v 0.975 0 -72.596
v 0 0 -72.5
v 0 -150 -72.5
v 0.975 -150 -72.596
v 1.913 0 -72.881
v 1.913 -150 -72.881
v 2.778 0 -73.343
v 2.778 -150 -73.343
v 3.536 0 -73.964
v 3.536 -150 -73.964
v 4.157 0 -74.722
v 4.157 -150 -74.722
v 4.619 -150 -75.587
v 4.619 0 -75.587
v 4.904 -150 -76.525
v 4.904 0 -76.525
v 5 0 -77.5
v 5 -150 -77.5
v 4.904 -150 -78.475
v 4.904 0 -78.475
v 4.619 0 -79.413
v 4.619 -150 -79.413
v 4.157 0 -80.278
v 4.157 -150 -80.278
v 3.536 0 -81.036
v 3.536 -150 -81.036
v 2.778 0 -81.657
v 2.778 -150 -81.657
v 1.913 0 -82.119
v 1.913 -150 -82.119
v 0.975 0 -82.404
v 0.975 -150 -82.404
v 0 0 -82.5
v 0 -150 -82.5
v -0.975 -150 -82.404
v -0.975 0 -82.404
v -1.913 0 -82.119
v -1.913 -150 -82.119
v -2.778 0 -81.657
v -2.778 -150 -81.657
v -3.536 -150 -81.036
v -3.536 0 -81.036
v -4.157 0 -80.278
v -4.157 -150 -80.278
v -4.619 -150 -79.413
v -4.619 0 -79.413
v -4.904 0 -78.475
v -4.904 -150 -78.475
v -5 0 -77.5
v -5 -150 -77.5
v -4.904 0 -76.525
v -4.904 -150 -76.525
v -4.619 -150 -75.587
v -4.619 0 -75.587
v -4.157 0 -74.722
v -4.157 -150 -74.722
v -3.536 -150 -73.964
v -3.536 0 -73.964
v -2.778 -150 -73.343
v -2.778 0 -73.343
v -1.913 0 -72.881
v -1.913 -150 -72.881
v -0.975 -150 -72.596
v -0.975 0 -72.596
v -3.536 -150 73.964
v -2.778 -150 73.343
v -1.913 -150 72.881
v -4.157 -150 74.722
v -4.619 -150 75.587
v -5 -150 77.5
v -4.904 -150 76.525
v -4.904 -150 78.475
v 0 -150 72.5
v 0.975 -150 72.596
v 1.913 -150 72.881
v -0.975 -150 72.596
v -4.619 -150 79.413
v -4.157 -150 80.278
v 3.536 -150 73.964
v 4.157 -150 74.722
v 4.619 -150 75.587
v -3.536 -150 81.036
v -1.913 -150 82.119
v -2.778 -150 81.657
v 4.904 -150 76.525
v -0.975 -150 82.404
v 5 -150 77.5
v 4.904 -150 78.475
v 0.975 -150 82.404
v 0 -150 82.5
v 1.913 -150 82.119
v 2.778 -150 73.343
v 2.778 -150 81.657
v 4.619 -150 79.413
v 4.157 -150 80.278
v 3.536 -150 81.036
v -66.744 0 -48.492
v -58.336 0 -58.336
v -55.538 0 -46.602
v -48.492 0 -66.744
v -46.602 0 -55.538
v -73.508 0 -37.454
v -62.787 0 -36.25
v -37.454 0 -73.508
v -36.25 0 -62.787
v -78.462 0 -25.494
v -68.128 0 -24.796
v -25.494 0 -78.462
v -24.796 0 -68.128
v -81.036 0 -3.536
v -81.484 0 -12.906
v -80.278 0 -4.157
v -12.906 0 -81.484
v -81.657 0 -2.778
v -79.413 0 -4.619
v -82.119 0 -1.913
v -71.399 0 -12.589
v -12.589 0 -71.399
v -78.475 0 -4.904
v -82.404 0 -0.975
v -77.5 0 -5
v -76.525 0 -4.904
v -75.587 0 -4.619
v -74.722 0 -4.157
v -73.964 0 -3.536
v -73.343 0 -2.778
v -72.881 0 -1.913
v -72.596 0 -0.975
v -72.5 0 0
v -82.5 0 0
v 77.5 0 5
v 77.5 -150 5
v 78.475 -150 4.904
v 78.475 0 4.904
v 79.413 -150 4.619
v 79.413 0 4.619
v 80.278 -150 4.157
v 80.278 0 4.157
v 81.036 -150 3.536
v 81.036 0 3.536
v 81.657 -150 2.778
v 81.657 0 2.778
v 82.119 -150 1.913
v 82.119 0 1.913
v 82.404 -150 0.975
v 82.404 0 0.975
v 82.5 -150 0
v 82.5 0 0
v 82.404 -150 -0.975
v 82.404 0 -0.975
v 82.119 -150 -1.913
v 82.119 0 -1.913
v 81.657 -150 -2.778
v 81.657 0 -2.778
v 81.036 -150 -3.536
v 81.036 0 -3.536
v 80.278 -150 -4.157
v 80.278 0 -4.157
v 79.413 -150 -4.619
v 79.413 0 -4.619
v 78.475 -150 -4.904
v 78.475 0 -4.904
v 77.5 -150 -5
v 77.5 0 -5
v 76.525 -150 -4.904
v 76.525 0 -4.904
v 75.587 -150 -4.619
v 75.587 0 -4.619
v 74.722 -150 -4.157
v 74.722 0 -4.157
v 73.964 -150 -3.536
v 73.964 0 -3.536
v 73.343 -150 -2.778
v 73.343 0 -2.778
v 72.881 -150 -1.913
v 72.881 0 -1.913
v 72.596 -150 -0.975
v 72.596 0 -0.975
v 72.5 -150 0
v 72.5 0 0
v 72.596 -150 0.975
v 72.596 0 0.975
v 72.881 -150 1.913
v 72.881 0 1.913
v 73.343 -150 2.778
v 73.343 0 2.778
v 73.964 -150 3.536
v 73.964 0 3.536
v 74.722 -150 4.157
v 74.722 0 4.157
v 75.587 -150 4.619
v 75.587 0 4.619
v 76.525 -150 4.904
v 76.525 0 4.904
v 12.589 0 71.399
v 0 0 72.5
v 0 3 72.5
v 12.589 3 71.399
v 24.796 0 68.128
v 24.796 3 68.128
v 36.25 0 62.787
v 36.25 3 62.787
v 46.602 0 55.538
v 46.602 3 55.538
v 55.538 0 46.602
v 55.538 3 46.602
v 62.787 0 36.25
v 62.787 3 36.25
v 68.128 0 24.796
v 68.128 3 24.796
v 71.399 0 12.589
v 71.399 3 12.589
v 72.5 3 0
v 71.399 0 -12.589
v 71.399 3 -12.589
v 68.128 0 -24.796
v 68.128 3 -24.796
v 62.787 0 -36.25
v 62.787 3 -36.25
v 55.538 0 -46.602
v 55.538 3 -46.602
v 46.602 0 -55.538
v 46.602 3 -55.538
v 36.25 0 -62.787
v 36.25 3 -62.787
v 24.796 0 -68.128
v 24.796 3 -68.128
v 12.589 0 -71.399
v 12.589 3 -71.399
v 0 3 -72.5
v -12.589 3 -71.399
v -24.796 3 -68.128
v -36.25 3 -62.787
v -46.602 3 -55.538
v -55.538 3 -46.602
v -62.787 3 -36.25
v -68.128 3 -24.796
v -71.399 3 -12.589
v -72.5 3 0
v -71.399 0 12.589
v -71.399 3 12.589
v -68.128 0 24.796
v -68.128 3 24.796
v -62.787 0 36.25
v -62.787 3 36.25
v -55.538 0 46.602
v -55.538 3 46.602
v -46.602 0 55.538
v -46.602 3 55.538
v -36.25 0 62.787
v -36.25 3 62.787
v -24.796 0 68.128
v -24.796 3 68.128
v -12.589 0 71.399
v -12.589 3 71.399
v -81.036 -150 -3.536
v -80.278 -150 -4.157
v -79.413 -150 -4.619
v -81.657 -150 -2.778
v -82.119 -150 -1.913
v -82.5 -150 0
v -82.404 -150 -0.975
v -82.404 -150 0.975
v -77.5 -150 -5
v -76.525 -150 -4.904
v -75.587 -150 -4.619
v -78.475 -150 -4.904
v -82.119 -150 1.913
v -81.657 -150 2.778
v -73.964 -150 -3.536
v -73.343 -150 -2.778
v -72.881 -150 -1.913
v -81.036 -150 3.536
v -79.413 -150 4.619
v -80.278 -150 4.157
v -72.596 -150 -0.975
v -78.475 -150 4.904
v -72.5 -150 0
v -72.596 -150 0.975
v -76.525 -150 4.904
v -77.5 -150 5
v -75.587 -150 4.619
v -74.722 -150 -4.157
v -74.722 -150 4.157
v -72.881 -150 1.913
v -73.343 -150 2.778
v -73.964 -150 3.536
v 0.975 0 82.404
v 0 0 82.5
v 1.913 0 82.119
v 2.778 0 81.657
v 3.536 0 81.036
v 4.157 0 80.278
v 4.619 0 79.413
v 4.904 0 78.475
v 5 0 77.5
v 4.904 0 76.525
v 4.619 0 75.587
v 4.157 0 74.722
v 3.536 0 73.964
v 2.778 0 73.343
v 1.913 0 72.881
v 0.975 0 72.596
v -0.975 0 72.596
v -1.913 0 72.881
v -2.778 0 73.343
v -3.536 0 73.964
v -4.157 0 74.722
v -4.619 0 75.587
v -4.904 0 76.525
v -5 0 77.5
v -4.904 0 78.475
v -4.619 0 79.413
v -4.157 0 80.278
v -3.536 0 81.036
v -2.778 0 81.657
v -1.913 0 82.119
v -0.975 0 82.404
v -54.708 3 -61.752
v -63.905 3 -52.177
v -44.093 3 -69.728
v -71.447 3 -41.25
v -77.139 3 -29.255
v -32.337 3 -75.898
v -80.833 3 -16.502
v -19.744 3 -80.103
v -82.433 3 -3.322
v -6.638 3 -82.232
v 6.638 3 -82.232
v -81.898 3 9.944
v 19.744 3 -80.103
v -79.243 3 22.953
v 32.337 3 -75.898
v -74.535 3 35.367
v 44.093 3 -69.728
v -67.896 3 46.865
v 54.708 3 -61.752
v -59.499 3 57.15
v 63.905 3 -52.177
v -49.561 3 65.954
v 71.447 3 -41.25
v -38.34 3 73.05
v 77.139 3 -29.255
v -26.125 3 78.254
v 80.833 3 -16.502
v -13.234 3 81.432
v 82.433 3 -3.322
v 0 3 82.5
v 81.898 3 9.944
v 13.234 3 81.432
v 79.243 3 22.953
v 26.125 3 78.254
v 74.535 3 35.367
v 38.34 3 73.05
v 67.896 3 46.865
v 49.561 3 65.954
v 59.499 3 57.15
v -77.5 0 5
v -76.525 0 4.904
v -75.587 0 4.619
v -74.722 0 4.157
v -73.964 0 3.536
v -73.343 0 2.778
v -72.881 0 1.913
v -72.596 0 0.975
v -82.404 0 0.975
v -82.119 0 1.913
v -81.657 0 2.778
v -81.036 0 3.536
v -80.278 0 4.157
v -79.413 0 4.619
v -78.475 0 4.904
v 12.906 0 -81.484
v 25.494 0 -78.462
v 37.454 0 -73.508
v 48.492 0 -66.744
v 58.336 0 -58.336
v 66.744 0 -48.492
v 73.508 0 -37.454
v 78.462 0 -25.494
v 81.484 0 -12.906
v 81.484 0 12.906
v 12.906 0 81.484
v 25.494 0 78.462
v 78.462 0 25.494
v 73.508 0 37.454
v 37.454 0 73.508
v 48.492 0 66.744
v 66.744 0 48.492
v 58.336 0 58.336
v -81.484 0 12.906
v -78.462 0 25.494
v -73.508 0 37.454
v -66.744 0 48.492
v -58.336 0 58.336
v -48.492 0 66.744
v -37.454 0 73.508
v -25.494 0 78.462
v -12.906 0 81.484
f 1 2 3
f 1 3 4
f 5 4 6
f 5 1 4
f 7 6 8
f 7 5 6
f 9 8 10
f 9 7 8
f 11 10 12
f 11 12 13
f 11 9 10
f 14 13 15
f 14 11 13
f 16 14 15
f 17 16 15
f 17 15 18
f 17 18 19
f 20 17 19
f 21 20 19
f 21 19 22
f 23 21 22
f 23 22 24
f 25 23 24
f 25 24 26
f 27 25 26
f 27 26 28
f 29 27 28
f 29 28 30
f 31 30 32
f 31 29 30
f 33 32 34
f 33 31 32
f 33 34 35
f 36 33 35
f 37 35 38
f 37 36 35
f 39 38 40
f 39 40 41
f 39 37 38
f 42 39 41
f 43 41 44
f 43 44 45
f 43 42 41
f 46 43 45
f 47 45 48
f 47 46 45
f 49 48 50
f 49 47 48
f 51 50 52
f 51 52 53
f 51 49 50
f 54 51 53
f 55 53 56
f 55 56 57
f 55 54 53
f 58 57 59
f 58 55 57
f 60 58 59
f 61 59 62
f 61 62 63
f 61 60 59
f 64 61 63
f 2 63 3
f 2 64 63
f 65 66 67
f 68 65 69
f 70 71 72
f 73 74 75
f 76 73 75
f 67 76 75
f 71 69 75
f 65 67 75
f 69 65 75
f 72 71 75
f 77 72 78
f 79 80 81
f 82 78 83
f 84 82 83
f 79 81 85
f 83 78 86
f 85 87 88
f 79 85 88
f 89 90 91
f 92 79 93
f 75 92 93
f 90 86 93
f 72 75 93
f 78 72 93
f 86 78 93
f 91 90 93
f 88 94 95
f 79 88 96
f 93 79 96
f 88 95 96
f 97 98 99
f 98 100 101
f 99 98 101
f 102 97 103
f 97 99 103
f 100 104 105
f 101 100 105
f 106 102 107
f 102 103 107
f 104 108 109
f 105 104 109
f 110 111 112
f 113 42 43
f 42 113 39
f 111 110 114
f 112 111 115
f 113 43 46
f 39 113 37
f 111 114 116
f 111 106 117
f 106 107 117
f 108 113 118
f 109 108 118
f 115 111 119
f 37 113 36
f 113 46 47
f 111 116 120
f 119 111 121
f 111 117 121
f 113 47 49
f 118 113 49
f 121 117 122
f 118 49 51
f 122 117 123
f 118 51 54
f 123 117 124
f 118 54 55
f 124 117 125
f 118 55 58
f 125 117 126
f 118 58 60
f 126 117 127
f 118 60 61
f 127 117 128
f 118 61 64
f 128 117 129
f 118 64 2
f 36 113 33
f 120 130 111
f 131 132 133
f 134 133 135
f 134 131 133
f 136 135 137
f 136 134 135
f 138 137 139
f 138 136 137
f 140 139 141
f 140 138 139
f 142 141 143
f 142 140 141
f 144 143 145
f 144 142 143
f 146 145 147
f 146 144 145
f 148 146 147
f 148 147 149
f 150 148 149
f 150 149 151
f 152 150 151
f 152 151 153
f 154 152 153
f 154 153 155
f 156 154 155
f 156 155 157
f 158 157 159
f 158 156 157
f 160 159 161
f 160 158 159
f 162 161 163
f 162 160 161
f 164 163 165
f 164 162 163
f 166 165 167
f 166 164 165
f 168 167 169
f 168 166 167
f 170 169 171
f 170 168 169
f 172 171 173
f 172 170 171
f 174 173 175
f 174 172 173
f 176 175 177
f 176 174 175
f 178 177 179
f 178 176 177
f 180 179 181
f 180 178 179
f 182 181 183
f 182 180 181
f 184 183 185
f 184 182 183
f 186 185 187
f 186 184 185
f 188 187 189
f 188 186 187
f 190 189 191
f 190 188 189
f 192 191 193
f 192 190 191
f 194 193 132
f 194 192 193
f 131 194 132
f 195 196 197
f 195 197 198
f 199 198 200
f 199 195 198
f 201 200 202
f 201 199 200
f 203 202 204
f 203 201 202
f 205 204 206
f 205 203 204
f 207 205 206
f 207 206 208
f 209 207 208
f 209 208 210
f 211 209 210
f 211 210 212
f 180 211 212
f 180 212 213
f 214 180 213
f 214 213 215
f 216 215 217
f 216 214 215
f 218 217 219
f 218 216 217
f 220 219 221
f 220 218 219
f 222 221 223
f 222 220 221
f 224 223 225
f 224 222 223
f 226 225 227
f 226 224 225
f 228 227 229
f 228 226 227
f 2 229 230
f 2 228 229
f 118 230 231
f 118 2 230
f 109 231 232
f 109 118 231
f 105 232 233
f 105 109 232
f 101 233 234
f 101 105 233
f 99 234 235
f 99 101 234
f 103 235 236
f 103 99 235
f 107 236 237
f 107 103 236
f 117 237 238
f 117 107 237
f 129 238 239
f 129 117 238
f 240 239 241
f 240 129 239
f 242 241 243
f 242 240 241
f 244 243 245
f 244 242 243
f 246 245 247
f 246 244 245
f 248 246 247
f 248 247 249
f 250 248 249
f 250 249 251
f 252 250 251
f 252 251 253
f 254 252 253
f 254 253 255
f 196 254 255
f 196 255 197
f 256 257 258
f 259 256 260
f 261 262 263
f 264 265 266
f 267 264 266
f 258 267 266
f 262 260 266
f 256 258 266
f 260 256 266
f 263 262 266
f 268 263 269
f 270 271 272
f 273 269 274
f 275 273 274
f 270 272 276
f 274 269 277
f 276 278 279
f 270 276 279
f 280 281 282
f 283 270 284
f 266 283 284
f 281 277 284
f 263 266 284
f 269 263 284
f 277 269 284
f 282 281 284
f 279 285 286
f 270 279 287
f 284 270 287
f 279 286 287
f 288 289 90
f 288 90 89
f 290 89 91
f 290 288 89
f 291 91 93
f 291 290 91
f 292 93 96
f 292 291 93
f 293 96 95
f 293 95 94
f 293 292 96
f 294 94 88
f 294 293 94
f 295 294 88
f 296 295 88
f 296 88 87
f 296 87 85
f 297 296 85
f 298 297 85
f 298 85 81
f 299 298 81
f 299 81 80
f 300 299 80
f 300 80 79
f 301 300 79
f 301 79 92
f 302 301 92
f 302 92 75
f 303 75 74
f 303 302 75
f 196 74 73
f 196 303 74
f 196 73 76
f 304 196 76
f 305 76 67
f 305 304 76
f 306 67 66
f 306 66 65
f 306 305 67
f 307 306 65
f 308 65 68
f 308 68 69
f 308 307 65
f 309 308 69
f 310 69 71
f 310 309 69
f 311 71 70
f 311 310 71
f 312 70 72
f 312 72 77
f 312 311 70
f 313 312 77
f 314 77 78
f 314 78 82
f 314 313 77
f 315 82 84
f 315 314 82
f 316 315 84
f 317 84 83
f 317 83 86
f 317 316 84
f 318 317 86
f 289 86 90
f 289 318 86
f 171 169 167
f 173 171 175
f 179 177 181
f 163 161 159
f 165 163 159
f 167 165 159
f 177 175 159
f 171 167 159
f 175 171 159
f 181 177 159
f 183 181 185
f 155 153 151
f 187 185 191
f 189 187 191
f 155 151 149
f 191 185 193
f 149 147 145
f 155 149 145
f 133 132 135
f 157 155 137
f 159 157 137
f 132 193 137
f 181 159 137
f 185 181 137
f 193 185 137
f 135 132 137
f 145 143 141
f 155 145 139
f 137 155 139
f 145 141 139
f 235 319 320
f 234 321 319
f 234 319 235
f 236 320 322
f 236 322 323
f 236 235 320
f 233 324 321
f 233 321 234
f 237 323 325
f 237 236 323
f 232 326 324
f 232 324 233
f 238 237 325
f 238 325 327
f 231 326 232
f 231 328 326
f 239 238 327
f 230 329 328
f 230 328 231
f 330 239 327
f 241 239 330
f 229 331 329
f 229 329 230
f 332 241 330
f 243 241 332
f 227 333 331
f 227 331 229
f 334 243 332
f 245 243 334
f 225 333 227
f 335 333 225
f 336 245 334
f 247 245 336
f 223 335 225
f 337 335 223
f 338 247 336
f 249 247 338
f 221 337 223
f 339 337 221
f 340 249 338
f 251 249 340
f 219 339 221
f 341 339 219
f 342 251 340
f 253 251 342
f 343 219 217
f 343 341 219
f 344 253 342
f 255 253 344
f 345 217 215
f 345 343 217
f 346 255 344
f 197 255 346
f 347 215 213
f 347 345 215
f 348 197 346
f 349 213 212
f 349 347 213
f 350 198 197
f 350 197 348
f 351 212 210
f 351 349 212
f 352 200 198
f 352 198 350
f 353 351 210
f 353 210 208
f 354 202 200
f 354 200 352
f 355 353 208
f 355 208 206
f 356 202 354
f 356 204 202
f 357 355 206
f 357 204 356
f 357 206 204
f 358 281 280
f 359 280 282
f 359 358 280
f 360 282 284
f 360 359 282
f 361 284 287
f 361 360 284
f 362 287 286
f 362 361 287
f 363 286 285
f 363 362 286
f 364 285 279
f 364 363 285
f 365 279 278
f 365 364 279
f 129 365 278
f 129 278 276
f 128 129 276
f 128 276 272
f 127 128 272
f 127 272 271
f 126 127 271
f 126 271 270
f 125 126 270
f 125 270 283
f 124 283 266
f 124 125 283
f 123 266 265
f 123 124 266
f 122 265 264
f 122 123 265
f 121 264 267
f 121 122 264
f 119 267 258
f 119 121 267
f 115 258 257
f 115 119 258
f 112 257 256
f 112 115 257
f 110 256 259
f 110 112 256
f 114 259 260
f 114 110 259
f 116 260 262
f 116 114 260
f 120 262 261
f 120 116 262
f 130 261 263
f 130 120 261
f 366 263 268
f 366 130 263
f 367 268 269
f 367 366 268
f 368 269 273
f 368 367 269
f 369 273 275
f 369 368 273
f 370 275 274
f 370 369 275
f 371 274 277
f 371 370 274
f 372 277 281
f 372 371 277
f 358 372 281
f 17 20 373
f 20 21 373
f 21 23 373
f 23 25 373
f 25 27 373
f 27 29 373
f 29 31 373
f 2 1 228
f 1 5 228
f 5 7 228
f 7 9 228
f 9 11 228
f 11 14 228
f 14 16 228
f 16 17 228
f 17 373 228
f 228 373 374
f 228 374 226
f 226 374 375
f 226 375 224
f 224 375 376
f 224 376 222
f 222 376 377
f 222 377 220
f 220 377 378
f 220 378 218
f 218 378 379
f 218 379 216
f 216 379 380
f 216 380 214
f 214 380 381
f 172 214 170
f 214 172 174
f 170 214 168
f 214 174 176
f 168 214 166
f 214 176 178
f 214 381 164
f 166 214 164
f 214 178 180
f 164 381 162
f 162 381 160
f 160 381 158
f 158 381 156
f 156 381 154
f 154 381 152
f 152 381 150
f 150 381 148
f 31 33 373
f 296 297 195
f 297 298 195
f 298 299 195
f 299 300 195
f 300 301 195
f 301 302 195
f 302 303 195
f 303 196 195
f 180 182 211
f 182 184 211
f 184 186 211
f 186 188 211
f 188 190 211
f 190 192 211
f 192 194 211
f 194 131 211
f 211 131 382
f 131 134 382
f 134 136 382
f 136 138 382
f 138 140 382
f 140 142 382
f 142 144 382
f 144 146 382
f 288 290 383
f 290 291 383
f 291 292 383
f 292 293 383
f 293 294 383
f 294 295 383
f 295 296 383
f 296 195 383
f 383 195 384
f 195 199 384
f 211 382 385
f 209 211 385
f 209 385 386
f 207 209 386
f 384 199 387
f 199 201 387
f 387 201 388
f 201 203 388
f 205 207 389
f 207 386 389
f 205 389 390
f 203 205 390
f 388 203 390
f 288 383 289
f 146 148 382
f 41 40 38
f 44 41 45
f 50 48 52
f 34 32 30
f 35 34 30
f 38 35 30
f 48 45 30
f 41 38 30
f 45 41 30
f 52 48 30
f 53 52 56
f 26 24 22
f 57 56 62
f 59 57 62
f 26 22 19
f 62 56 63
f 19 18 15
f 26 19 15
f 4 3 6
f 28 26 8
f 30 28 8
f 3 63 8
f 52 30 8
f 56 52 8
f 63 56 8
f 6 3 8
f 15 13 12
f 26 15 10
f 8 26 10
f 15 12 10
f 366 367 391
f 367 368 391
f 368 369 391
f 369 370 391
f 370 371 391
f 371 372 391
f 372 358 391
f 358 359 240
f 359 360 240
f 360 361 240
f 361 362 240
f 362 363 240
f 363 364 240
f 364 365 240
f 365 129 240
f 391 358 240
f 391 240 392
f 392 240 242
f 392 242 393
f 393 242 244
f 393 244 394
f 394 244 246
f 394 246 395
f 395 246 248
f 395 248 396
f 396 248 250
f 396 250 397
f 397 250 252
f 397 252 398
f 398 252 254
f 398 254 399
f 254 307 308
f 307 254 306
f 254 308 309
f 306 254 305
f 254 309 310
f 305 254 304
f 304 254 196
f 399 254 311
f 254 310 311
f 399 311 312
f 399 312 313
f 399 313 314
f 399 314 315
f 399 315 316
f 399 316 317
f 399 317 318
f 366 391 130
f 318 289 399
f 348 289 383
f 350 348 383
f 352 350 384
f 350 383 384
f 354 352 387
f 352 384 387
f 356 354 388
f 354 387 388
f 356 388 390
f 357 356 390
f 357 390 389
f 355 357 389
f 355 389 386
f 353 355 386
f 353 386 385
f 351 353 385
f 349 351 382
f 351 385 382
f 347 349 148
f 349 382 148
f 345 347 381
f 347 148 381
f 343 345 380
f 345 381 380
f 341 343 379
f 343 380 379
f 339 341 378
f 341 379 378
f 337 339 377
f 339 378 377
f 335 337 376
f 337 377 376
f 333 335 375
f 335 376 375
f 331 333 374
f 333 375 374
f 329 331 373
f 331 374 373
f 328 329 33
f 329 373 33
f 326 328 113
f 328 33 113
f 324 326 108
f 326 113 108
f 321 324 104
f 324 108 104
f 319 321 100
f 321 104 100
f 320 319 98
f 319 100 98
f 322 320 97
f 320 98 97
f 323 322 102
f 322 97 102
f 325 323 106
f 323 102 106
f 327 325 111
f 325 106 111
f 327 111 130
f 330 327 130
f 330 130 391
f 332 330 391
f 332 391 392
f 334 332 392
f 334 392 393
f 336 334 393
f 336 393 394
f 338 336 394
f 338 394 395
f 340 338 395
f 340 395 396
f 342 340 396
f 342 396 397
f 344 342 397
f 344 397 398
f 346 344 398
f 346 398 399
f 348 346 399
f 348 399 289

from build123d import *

# Parameters (mm, degrees)
SKETCH1_R           = 82.5
SKETCH1_R_2         = 72.5
BOSS_EXTRUDE1_DEPTH = 3
SKETCH2_R           = 5
BOSS_EXTRUDE2_DEPTH = 150


with BuildPart() as part:
    # Sketch1 → Boss-Extrude1 (new body)
    with BuildSketch(Plane(origin=(0, 0, 0), x_dir=(1, 0, 0), z_dir=(0, 1, 0))):
        Circle(SKETCH1_R)
        Circle(SKETCH1_R_2, mode=Mode.SUBTRACT)
    extrude(amount=BOSS_EXTRUDE1_DEPTH)

    # Sketch2 → Boss-Extrude2 (add)
    with BuildSketch(Plane(origin=(0, 0, 0), x_dir=(1, 0, 0), z_dir=(0, 1, 0))):
        with Locations((-77.5, 0)):
            Circle(SKETCH2_R)
        with Locations((0, -77.5)):
            Circle(SKETCH2_R)
        with Locations((77.5, 0)):
            Circle(SKETCH2_R)
        with Locations((0, 77.5)):
            Circle(SKETCH2_R)
    extrude(amount=-BOSS_EXTRUDE2_DEPTH)


solid = part.part
